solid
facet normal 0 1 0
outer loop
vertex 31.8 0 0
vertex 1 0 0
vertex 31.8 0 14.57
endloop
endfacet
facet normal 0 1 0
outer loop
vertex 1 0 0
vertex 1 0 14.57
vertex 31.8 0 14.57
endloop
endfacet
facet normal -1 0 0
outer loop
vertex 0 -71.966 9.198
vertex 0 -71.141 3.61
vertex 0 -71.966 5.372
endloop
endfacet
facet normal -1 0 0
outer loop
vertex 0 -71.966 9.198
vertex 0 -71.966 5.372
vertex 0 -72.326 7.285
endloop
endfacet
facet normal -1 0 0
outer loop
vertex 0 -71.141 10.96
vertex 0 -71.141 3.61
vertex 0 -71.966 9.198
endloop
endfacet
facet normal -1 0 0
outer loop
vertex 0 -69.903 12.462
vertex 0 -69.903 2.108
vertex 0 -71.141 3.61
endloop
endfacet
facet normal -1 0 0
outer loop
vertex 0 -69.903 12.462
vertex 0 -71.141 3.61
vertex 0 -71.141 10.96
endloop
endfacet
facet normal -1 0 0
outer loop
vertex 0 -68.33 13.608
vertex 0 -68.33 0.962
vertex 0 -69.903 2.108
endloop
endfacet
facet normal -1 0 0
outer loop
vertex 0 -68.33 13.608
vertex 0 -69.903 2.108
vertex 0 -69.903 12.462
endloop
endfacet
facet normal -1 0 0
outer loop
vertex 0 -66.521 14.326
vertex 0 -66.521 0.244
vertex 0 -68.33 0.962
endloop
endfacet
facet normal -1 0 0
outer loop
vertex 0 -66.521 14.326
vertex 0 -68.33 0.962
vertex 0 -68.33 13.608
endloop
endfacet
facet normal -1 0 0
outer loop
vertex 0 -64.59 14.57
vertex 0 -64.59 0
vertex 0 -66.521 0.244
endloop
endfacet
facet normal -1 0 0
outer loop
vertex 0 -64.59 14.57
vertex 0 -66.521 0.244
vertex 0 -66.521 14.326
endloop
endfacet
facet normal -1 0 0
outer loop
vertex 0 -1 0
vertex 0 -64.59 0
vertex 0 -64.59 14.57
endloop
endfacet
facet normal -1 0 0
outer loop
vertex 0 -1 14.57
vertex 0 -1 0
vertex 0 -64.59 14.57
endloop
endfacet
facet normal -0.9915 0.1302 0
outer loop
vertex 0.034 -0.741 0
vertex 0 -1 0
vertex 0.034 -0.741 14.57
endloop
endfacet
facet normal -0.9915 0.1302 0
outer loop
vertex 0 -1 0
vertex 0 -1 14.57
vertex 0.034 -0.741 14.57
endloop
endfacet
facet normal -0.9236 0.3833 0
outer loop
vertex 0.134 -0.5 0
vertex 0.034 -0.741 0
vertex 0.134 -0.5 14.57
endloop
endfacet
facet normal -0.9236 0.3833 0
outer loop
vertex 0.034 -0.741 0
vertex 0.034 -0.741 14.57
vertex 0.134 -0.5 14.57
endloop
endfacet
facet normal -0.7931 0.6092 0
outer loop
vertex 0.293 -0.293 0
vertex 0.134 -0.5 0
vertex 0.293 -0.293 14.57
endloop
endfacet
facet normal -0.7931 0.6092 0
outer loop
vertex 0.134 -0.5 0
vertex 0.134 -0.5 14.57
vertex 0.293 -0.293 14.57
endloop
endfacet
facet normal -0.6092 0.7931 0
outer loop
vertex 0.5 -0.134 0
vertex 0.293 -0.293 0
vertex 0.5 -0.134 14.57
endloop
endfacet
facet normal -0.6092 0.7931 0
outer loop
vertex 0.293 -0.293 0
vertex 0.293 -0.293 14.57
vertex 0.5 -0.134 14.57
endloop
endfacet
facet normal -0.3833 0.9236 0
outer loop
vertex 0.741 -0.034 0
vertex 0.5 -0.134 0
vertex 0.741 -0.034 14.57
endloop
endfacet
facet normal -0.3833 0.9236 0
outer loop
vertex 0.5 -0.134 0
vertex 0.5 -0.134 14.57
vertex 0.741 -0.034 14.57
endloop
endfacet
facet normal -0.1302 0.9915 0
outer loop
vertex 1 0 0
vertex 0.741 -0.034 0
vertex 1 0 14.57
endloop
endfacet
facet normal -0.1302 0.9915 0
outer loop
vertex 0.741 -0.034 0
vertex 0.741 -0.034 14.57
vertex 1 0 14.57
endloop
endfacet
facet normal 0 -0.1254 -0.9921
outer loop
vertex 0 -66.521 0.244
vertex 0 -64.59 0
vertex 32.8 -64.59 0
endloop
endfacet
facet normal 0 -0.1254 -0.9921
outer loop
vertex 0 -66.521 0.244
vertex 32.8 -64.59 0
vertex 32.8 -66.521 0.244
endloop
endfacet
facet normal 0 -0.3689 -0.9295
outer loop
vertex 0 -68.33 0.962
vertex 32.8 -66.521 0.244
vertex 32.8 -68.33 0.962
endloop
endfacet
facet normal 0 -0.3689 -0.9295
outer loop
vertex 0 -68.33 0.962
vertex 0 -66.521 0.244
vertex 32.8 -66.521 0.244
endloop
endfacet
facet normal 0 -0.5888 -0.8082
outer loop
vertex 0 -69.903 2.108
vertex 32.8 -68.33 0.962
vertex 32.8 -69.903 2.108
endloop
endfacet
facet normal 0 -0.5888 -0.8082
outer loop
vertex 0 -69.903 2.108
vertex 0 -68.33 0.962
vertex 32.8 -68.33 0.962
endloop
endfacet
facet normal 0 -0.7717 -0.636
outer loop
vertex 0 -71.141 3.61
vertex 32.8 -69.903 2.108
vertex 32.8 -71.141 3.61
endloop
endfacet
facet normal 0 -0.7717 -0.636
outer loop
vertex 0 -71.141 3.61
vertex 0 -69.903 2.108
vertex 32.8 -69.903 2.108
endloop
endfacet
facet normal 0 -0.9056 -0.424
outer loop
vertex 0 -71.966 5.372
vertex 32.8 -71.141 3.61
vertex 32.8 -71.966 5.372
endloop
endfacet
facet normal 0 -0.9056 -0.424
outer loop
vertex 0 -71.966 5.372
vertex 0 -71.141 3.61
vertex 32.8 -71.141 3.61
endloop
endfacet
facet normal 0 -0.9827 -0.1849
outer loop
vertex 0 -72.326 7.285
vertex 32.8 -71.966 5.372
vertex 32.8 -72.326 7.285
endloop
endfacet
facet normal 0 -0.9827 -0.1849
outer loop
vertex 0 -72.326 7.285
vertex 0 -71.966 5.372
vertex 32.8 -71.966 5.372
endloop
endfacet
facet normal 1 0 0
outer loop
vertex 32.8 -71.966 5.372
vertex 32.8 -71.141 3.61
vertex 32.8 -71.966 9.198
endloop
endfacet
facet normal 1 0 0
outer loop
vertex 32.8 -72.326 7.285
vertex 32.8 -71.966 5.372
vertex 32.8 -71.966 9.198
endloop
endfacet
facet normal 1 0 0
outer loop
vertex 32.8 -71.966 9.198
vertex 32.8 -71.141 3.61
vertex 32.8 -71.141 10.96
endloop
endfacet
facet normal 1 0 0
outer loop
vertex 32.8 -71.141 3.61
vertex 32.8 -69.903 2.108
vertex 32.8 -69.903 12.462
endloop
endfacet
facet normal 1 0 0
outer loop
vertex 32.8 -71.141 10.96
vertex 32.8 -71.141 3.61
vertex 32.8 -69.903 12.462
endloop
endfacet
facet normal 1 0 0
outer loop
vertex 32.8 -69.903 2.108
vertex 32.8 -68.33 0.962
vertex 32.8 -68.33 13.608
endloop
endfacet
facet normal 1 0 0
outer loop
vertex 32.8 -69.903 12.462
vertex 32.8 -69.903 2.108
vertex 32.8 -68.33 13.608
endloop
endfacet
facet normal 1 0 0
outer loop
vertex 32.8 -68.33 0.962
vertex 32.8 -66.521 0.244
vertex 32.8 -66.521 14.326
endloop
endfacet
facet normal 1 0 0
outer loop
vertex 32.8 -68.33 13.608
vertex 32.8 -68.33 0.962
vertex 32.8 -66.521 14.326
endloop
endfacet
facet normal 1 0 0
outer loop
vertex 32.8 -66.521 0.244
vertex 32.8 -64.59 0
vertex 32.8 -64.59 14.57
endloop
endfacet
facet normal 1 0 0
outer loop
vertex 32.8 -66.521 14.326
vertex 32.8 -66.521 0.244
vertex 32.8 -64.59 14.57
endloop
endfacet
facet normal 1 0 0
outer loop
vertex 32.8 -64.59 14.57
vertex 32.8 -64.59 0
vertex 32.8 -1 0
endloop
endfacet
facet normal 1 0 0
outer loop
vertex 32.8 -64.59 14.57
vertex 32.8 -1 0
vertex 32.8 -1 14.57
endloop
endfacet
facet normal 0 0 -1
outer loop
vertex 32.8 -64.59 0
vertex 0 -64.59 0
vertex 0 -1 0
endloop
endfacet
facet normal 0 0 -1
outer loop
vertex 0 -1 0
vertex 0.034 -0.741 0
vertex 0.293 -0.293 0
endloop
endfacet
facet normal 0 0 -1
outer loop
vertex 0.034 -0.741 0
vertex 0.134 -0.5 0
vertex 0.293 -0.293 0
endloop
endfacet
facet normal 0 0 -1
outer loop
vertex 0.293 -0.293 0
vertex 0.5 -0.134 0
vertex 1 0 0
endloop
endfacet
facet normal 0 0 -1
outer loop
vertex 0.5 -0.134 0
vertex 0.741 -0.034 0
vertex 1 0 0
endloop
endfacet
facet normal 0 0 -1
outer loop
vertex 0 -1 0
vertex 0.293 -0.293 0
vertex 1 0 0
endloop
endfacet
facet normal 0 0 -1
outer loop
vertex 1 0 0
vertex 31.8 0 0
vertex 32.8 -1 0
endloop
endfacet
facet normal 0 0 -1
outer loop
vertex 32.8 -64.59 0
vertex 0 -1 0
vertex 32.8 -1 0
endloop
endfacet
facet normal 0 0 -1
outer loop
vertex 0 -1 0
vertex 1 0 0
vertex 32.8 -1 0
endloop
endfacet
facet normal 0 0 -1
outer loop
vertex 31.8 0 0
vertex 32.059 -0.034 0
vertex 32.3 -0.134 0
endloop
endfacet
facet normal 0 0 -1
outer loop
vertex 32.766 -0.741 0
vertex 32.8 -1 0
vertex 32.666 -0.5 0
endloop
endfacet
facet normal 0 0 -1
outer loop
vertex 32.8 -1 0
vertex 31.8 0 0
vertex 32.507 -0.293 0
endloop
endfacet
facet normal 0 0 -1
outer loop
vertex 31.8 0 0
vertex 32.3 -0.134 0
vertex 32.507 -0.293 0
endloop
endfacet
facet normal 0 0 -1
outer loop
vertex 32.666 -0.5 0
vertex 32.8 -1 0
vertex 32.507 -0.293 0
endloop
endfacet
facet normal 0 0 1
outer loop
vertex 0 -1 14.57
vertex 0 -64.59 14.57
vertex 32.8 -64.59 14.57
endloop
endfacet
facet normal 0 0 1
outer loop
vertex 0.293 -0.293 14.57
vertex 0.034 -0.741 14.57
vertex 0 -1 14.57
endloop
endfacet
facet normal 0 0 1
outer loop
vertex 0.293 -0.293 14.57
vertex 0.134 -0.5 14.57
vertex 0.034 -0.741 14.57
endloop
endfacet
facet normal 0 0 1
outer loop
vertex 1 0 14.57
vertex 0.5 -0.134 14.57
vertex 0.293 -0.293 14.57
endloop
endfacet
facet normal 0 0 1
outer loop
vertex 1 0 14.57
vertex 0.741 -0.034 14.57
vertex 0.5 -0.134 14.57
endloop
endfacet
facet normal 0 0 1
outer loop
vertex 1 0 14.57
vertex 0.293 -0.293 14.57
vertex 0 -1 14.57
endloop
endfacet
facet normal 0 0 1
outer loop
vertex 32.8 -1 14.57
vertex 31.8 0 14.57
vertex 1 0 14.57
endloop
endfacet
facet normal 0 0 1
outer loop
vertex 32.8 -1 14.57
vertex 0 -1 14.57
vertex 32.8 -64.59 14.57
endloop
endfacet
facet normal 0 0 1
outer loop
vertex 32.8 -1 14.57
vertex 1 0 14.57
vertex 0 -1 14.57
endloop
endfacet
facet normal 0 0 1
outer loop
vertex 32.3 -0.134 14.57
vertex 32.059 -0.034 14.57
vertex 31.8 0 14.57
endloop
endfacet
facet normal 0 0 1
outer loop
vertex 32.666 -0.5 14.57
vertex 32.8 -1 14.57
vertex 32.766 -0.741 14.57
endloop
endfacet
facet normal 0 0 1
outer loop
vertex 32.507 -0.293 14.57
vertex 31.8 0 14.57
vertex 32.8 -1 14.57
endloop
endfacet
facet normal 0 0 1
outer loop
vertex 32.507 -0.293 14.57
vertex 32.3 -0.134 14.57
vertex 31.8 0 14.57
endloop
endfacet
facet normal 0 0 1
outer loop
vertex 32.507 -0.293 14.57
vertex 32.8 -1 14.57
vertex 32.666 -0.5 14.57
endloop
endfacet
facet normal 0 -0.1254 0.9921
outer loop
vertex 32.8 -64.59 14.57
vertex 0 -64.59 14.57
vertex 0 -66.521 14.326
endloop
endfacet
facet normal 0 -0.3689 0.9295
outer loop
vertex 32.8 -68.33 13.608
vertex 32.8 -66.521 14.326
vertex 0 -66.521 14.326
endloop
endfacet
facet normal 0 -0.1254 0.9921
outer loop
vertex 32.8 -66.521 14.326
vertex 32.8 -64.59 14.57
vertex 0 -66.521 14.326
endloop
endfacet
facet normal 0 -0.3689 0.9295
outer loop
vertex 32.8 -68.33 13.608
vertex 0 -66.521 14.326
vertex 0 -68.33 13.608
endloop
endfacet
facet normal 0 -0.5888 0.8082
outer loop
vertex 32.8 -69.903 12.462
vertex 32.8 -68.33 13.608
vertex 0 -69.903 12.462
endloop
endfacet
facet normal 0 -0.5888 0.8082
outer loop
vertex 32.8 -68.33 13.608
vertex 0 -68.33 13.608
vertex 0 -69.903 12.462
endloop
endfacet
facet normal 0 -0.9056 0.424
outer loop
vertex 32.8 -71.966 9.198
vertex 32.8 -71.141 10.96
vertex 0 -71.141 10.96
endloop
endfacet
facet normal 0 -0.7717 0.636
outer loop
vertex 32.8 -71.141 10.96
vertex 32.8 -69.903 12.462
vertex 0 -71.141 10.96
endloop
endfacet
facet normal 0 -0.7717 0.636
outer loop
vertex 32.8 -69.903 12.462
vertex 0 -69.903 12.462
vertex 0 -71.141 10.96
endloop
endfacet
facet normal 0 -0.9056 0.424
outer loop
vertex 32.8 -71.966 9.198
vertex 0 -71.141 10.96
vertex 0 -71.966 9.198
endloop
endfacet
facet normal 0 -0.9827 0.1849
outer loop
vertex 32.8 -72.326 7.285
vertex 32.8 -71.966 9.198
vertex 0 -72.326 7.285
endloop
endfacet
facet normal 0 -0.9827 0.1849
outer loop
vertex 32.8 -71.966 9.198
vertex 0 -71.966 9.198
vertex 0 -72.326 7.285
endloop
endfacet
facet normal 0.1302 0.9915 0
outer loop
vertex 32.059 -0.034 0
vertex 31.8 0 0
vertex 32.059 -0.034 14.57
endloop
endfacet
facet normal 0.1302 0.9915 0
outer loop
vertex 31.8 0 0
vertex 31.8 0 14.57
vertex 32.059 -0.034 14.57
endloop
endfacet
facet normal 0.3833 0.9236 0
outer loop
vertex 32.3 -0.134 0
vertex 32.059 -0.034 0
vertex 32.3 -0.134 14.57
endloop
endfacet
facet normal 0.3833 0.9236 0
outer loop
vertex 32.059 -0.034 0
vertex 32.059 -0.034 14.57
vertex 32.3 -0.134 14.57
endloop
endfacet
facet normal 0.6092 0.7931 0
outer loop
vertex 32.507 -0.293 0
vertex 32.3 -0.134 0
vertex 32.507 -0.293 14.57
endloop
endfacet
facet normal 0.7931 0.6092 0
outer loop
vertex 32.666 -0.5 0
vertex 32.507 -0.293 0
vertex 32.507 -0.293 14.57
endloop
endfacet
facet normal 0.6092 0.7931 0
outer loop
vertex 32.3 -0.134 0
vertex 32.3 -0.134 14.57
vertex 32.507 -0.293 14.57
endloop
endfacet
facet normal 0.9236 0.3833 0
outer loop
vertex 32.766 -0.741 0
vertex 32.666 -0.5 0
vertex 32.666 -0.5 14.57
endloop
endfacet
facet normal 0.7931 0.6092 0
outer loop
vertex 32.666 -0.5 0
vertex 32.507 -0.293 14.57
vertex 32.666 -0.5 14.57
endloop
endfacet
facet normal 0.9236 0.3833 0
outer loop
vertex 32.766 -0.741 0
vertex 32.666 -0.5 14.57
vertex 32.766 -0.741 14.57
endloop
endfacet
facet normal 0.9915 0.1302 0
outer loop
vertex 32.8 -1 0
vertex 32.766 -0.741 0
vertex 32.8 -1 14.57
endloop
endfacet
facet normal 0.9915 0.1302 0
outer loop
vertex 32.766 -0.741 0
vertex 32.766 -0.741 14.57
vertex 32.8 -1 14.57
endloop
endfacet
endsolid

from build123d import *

# Parameters (mm, degrees)
F0_W        = 32.8
F0_H        = 14.57
F1_DEPTH    = 72.34
F2_T1_DEPTH = 71.55
F3_R        = 1


# Not quite as in the source:
# - a fillet or chamfer that OpenCascade refuses, or shapes differently, is made with other operations: its cross-section is extruded or revolved along the edge and cut away or added


with BuildPart() as f1:
    # F0 (on Front) → F1 (new body)
    with BuildSketch(Plane.XZ):
        with Locations((16.4, 7.285)):
            Rectangle(F0_W, F0_H)
    extrude(amount=F1_DEPTH)

    # F2: fillet of radius 7.75 on 2 edges, made by hand

    # F2_s2 → F2_t1 (cut)
    with BuildSketch(Plane.YZ.offset(-19.375)):
        with BuildLine():
            ThreePointArc((-64.59, 14.57), (-70.0700775542, 12.3000775542), (-72.34, 6.82))
            Line((-72.34, 6.82), (-72.34, 14.57))
            Line((-72.34, 14.57), (-64.59, 14.57))
        make_face()
        with BuildLine():
            ThreePointArc((-64.59, 0), (-70.0700775542, 2.2699224458), (-72.34, 7.75))
            Line((-72.34, 7.75), (-72.34, 0))
            Line((-72.34, 0), (-64.59, 0))
        make_face()
    extrude(amount=F2_T1_DEPTH, mode=Mode.SUBTRACT)

    # F3
    f3_edges = [f1.edges().sort_by_distance(p)[0] for p in [
        (0, 0, 7.285),
        (32.8, 0, 7.285),
    ]]
    fillet(f3_edges, radius=F3_R)


solid = f1.part
